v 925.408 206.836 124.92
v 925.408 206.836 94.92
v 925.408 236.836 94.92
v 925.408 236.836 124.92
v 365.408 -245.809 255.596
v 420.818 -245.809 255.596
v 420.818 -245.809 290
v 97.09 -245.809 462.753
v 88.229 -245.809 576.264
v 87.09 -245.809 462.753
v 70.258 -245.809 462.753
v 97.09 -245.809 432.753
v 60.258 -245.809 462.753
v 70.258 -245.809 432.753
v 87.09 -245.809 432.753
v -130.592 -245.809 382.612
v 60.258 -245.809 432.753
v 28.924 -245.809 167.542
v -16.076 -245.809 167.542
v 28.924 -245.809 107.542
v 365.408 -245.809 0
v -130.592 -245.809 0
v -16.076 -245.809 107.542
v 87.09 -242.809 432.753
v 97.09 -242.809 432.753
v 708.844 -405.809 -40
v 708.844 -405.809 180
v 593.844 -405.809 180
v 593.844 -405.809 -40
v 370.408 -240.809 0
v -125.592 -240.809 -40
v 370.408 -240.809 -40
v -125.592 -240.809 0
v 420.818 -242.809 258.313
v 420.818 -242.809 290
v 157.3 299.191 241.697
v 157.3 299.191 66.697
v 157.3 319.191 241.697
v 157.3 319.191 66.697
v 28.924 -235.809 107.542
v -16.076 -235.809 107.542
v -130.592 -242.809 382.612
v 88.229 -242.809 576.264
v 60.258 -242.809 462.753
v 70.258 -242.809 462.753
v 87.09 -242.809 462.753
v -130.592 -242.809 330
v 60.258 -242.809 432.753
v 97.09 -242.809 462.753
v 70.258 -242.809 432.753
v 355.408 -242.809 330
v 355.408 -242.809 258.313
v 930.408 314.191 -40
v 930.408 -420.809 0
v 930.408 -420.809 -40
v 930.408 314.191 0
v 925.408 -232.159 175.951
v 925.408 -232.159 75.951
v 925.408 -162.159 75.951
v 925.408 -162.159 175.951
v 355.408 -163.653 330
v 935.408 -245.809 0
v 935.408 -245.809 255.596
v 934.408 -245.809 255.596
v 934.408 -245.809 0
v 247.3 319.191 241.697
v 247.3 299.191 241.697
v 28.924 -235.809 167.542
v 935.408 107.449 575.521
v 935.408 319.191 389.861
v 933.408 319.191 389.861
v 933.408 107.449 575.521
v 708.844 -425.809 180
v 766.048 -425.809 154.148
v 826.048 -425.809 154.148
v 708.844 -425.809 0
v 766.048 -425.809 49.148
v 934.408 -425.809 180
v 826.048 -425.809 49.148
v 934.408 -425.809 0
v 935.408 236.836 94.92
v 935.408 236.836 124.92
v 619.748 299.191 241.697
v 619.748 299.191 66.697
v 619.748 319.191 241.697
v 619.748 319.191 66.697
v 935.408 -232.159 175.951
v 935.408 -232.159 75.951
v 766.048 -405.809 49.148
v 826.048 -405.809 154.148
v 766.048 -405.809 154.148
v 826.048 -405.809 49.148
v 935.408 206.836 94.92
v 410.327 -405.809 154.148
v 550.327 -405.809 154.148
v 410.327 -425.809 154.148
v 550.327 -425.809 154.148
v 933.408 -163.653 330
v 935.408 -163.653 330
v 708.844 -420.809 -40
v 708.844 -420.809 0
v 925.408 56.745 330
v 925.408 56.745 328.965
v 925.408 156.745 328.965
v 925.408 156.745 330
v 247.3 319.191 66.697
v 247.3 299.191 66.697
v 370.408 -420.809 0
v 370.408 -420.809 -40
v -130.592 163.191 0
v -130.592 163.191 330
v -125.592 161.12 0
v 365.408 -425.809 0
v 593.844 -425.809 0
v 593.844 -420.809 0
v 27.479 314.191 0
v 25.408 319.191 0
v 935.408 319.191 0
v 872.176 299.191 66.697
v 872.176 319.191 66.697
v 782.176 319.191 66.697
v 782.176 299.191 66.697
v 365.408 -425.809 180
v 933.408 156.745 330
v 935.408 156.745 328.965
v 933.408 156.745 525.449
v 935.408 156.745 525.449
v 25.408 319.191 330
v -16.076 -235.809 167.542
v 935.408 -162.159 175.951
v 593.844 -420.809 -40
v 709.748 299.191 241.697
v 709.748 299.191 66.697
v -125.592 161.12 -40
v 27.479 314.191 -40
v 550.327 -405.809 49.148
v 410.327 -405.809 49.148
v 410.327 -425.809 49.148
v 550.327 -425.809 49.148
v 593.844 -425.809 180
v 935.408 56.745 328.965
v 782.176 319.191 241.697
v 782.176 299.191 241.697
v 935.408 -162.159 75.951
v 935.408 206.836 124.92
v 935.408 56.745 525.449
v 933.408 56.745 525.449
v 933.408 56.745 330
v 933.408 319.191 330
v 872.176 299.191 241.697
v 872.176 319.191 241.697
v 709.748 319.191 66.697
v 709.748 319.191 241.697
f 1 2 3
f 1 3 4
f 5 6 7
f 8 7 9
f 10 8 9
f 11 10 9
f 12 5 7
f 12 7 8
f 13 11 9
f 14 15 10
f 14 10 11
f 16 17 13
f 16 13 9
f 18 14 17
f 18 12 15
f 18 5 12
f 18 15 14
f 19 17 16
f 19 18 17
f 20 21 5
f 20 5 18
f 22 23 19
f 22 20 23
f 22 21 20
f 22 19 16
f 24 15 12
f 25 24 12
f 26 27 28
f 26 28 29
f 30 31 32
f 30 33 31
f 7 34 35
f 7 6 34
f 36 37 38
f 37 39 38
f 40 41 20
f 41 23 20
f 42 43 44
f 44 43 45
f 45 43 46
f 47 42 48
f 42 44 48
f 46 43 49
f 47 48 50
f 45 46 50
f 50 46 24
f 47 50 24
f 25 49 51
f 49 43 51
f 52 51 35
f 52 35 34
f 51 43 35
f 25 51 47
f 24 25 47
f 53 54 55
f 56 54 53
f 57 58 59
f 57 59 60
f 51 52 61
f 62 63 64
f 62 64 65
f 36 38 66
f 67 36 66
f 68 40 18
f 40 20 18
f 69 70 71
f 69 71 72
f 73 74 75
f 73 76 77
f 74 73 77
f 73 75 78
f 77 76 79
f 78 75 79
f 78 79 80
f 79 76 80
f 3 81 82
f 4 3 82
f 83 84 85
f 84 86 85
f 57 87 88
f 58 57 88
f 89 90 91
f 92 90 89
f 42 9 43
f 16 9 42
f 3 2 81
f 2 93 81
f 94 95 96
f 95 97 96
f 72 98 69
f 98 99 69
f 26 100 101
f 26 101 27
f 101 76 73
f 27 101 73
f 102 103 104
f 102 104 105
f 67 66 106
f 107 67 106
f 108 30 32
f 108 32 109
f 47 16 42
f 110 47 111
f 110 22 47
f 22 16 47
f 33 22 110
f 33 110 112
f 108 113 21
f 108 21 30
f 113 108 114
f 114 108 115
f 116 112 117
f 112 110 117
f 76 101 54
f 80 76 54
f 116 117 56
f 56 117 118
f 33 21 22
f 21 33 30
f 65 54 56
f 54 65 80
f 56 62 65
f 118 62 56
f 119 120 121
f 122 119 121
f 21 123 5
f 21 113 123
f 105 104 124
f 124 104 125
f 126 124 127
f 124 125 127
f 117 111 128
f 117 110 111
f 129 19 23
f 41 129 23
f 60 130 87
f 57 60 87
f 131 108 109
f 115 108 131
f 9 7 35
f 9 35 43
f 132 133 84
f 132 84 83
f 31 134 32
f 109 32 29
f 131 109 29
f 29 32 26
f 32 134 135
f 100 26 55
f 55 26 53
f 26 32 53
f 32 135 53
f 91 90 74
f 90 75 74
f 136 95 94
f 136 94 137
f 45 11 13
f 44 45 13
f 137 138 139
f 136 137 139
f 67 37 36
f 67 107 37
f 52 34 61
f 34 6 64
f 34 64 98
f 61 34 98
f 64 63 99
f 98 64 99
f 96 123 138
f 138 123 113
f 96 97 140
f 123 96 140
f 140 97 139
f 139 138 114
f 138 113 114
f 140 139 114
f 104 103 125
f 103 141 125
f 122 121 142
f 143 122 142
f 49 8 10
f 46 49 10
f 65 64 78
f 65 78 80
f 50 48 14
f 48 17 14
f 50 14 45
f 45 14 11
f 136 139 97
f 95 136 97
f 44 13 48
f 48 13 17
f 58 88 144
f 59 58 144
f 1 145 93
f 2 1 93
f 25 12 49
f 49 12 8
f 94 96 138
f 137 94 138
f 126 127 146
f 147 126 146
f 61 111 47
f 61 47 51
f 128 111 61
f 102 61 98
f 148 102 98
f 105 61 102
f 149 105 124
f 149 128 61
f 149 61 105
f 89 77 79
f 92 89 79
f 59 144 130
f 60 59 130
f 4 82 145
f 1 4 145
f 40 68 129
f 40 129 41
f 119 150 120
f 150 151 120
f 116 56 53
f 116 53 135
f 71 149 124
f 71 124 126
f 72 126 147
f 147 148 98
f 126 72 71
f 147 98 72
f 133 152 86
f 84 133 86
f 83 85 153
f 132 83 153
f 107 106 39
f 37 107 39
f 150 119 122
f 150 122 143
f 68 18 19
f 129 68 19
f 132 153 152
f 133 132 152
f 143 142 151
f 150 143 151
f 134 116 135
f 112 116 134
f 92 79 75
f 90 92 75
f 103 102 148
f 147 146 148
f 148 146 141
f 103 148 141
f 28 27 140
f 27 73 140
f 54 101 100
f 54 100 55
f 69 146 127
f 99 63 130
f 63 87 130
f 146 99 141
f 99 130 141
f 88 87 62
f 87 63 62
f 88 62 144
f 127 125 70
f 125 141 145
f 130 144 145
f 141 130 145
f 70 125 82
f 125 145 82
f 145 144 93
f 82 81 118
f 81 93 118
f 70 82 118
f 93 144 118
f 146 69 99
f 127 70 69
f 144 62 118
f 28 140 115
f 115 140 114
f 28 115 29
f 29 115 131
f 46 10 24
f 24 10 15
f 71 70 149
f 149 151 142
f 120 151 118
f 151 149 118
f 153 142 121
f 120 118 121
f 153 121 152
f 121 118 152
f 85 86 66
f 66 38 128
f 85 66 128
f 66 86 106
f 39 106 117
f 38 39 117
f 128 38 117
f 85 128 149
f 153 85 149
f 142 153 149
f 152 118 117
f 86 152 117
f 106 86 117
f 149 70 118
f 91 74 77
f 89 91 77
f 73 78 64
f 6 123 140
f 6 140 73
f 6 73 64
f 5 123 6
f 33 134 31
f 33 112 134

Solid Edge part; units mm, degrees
sketch "Sketch1" plane through (0, 0, 0) normal (0, 0, 1) x (1, 0, 0)
  line L0 (365.4075, -425.809) -> (935.4075, -425.809)
  line L1 (935.4075, -425.809) -> (935.4075, 319.191)
  line L2 (935.4075, 319.191) -> (25.4075, 319.191)
  line L3 (-130.5925, 163.191) -> (25.4075, 319.191)
  line L4 (-130.5925, -245.809) -> (-130.5925, 163.191)
  line L5 (365.4075, -245.809) -> (-130.5925, -245.809)
  line L6 (365.4075, -425.809) -> (365.4075, -245.809)
  dimension "D1" = 409
  dimension "D2" = 496
  dimension "D3" = 180
  dimension "D4" = 570
  dimension "D5" = 745
  dimension "D6" = 910
  dimension "D7" = 220.6173
extrude "Protrusion1" add sketch "Sketch1" along normal blind 330
sketch "Sketch2" plane through (365.4075, -335.809, 165) normal (-1, 0, 0) x (0, -1, 0)
  line L0 (90, 15) -> (-90, 90.5957)
  line L1 (-90, 90.5957) -> (-90, 165)
  line L2 (-90, 165) -> (90, 165)
  line L3 (90, 165) -> (90, 15)
extrude "Cutout1" cut sketch "Sketch2" against normal blind 730
sketch "Sketch3" plane through (935.4075, -53.309, 165) normal (1, 0, 0) x (0, 1, 0)
  line L0 (372.5, 90.5957) -> (372.5, 224.8613)
  line L1 (372.5, 224.8613) -> (160.7577, 410.5213)
  line L2 (-192.5, 90.5957) -> (160.7577, 410.5213)
  line L3 (-192.5, 90.5957) -> (372.5, 90.5957)
extrude "Protrusion2" add sketch "Sketch3" against normal blind 2
sketch "Sketch4" plane through (935.4075, -53.309, 261.575) normal (1, 0, 0) x (0, 1, 0)
  line L0 (-192.5, -5.9793) -> (-110.3437, 68.425)
  line L1 (-110.3437, 68.425) -> (-192.5, 68.425)
  line L2 (-192.5, 68.425) -> (-192.5, -5.9793)
extrude "ExtrudedCutout_40" cut sketch "Sketch4" against normal blind 580
sketch "Sketch5" plane through (117.4075, -245.809, 165) normal (0, -1, 0) x (1, 0, 0)
  line L0 (303.4101, 90.5957) -> (303.4101, 125)
  line L1 (303.4101, 125) -> (-29.1781, 411.2644)
  line L2 (-29.1781, 411.2644) -> (-248, 217.6121)
  line L3 (-248, 217.6121) -> (-248, 90.5957)
  line L4 (-248, 90.5957) -> (303.4101, 90.5957)
extrude "Protrusion3" add sketch "Sketch5" against normal blind 3
sketch "Sketch6" plane through (402.4075, -53.309, 0) normal (0, 0, -1) x (1, 0, 0)
  line L0 (528, 367.5) -> (528, -367.5)
  line L1 (528, -367.5) -> (-374.9289, -367.5)
  line L2 (-374.9289, -367.5) -> (-528, -214.4289)
  line L3 (-528, -214.4289) -> (-528, 187.5)
  line L4 (-528, 187.5) -> (-32, 187.5)
  line L5 (-32, 187.5) -> (-32, 367.5)
  line L6 (-32, 367.5) -> (528, 367.5)
extrude "ExtrudedProtrusion_65" add sketch "Sketch6" along normal blind 40
sketch "Sketch7" plane through (935.4075, -53.309, 261.575) normal (1, 0, 0) x (0, 1, 0)
  line L0 (110.0542, 67.3904) -> (210.0542, 67.3904)
  line L1 (210.0542, 67.3904) -> (210.0542, 263.8741)
  line L2 (210.0542, 263.8741) -> (110.0542, 263.8741)
  line L3 (110.0542, 263.8741) -> (110.0542, 67.3904)
  line L4 (-178.8496, -185.6242) -> (-108.8496, -185.6242)
  line L5 (-108.8496, -185.6242) -> (-108.8496, -85.6242)
  line L6 (-108.8496, -85.6242) -> (-178.8496, -85.6242)
  line L7 (-178.8496, -85.6242) -> (-178.8496, -185.6242)
  line L8 (260.1448, -166.6553) -> (290.1448, -166.6553)
  line L9 (290.1448, -166.6553) -> (290.1448, -136.6553)
  line L10 (290.1448, -136.6553) -> (260.1448, -136.6553)
  line L11 (260.1448, -136.6553) -> (260.1448, -166.6553)
extrude "Cutout2" cut sketch "Sketch7" against normal blind 10
sketch "Sketch8" plane through (650.4075, -425.809, 90) normal (0, -1, 0) x (1, 0, 0)
  line L0 (-56.5636, -130) -> (58.4364, -130)
  line L1 (58.4364, -130) -> (58.4364, 90)
  line L2 (58.4364, 90) -> (-56.5636, 90)
  line L3 (-56.5636, 90) -> (-56.5636, -130)
  line L4 (115.641, -40.8515) -> (175.641, -40.8515)
  line L5 (175.641, -40.8515) -> (175.641, 64.1485)
  line L6 (175.641, 64.1485) -> (115.641, 64.1485)
  line L7 (115.641, 64.1485) -> (115.641, -40.8515)
  line L8 (-240.0809, -40.8515) -> (-100.0809, -40.8515)
  line L9 (-100.0809, -40.8515) -> (-100.0809, 64.1485)
  line L10 (-100.0809, 64.1485) -> (-240.0809, 64.1485)
  line L11 (-240.0809, 64.1485) -> (-240.0809, -40.8515)
extrude "ExtrudedCutout_42" cut sketch "Sketch8" against normal blind 20
sketch "Sketch9" plane through (145.1125, -245.809, 288.1322) normal (0, -1, 0) x (1, 0, 0)
  line L0 (-161.1882, -180.5905) -> (-116.1882, -180.5905)
  line L1 (-116.1882, -180.5905) -> (-116.1882, -120.5905)
  line L2 (-116.1882, -120.5905) -> (-161.1882, -120.5905)
  line L3 (-161.1882, -120.5905) -> (-161.1882, -180.5905)
  line L4 (-58.0225, 144.6205) -> (-48.0225, 144.6205)
  line L5 (-48.0225, 144.6205) -> (-48.0225, 174.6205)
  line L6 (-48.0225, 174.6205) -> (-58.0225, 174.6205)
  line L7 (-58.0225, 174.6205) -> (-58.0225, 144.6205)
  line L8 (-84.855, 144.6205) -> (-74.855, 144.6205)
  line L9 (-74.855, 144.6205) -> (-74.855, 174.6205)
  line L10 (-74.855, 174.6205) -> (-84.855, 174.6205)
  line L11 (-84.855, 174.6205) -> (-84.855, 144.6205)
extrude "Cutout3" cut sketch "Sketch9" against normal blind 10
sketch "Sketch10" plane through (480.4075, 319.191, 194.9306) normal (0, 1, 0) x (-1, 0, 0)
  line L0 (-391.7685, -128.2335) -> (-301.7685, -128.2335)
  line L1 (-301.7685, -128.2335) -> (-301.7685, 46.7665)
  line L2 (-301.7685, 46.7665) -> (-391.7685, 46.7665)
  line L3 (-391.7685, 46.7665) -> (-391.7685, -128.2335)
  line L4 (-229.3403, -128.2335) -> (-139.3403, -128.2335)
  line L5 (-139.3403, -128.2335) -> (-139.3403, 46.7665)
  line L6 (-139.3403, 46.7665) -> (-229.3403, 46.7665)
  line L7 (-229.3403, 46.7665) -> (-229.3403, -128.2335)
  line L8 (233.108, -128.2335) -> (323.108, -128.2335)
  line L9 (323.108, -128.2335) -> (323.108, 46.7665)
  line L10 (323.108, 46.7665) -> (233.108, 46.7665)
  line L11 (233.108, 46.7665) -> (233.108, -128.2335)
extrude "Cutout4" cut sketch "Sketch10" against normal blind 20
sketch "Sketch11" plane through (935.4075, -53.309, 287.7607) normal (1, 0, 0) x (0, 1, 0)
  line L0 (-372.5, -107.7607) -> (-192.5, -32.165)
  line L1 (-192.5, -32.165) -> (-192.5, -287.7607)
  line L2 (-192.5, -287.7607) -> (-372.5, -287.7607)
  line L3 (-372.5, -287.7607) -> (-372.5, -107.7607)
extrude "Cutout5" cut sketch "Sketch11" against normal blind 1
